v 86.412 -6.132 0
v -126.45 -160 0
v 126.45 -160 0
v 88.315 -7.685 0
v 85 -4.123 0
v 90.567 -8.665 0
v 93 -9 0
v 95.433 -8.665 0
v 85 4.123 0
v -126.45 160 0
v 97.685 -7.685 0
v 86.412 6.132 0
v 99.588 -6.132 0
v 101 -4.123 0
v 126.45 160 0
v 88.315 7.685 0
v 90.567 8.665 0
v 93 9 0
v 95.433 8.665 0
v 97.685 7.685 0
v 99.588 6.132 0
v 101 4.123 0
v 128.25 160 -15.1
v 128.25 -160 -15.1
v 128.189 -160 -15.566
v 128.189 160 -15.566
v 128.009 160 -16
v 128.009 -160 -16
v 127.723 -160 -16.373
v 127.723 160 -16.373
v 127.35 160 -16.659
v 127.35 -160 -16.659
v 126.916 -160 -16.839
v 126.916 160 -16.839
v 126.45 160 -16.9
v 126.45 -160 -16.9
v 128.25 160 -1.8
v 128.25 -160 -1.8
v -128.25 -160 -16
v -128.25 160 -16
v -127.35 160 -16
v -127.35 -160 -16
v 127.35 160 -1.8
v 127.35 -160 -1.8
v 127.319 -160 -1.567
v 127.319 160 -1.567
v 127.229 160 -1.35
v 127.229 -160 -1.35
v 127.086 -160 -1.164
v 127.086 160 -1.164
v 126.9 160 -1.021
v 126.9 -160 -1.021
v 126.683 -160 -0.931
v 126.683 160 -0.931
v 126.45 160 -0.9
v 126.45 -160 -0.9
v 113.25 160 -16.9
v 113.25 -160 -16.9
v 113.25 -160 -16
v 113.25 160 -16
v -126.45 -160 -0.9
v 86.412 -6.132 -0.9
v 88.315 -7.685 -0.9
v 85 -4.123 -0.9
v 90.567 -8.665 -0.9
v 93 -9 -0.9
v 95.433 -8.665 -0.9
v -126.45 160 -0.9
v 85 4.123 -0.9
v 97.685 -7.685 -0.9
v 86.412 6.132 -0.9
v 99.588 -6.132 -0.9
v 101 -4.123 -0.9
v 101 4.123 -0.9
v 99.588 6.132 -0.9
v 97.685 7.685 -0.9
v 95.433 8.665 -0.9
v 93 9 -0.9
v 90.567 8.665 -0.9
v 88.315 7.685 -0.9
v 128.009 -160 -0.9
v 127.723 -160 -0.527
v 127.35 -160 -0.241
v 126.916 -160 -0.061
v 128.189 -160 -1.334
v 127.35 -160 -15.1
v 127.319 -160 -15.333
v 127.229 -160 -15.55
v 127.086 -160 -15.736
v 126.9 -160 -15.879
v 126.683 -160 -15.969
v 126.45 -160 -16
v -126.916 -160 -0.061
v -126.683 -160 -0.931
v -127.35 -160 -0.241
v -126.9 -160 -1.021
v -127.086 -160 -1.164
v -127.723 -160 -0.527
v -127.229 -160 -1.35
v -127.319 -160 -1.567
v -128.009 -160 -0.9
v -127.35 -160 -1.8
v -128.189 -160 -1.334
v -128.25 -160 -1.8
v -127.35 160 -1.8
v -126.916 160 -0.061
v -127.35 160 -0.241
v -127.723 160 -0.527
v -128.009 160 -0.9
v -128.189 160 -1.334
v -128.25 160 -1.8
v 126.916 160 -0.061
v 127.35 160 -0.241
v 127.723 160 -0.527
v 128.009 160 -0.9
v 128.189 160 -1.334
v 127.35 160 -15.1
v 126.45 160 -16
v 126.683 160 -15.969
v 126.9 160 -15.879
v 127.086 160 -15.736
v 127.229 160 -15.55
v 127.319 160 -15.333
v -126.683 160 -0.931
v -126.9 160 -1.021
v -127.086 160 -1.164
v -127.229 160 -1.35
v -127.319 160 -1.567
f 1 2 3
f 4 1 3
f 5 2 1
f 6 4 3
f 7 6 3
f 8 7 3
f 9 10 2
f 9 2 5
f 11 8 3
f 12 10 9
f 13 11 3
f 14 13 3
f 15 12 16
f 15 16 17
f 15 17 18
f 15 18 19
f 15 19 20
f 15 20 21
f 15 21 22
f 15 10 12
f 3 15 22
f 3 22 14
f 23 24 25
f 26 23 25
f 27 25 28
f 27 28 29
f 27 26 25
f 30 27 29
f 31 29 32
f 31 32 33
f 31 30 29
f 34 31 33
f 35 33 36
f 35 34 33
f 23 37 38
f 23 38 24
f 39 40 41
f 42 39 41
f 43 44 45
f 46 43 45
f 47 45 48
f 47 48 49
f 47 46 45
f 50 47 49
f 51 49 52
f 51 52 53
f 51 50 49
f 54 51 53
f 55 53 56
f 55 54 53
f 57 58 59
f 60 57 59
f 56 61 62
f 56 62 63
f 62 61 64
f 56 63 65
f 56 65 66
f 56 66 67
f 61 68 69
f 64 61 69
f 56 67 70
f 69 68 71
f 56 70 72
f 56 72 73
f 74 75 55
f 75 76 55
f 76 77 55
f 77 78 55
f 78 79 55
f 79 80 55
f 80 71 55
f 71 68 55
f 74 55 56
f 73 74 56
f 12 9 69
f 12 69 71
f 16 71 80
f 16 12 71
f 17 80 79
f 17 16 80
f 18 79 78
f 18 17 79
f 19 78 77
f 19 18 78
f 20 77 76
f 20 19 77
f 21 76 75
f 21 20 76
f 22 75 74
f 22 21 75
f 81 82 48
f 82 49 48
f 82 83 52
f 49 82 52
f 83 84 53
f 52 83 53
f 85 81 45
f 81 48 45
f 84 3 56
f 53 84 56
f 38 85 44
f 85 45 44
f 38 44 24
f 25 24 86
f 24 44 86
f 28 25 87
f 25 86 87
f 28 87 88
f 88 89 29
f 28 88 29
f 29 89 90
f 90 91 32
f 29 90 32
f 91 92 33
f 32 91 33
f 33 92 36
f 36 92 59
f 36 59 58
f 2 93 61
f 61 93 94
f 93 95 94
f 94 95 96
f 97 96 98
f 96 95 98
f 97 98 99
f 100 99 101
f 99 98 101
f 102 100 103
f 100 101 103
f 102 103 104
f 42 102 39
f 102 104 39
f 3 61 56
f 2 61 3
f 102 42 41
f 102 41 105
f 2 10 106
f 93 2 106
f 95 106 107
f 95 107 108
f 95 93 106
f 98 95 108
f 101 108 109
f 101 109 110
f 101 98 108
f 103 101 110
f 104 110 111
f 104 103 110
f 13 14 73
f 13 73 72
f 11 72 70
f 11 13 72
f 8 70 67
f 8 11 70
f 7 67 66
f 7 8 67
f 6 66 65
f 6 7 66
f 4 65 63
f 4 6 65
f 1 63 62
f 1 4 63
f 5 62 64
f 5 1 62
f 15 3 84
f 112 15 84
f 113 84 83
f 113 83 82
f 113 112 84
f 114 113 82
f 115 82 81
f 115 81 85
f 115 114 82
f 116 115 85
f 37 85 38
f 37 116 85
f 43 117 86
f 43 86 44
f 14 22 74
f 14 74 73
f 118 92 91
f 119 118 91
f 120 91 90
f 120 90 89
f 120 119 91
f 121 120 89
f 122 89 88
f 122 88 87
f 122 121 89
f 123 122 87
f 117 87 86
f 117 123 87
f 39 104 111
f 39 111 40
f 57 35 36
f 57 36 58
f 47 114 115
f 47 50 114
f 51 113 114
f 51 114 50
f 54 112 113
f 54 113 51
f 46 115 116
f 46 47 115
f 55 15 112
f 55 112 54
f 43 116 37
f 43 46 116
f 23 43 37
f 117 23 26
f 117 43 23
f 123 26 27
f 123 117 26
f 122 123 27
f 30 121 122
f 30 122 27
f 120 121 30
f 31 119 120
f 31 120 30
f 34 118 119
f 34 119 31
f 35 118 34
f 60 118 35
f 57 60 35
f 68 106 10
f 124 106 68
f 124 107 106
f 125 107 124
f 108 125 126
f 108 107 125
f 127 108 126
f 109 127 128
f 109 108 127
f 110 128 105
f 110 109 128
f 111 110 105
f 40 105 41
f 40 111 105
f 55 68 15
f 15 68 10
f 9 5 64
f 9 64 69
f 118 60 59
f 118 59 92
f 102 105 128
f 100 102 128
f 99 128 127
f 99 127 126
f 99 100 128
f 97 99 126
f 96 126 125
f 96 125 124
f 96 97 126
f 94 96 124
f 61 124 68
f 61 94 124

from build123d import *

# Parameters (mm, degrees)
SKETCH1_W                      = 256.5
SKETCH1_H                      = 320
BASE_FLANGE1_DEPTH             = 0.9
EDGE_FLANGE1_STRIP_W           = 5.4
EDGE_FLANGE1_STRIP_H           = 0.9
EDGE_FLANGE1_STRIP_CUT_DEPTH   = 320
EDGE_FLANGE1_STRIP_2_W         = 5.4
EDGE_FLANGE1_STRIP_2_H         = 0.9
EDGE_FLANGE1_STRIP_CUT_2_DEPTH = 320
EDGE_FLANGE1_DEPTH             = 320
EDGE_FLANGE1_BEND_DEPTH        = 320
EDGE_FLANGE2_STRIP_W           = 5.4
EDGE_FLANGE2_STRIP_H           = 0.9
EDGE_FLANGE2_STRIP_CUT_DEPTH   = 320
EDGE_FLANGE2_DEPTH             = 320
CUT_EXTRUDE1_DEPTH             = 206.751482376


# Sheet-metal steps are written as plain solids
with BuildPart() as part:
    # Sketch1 → Base-Flange1 (new body)
    with BuildSketch(Plane.XY):
        Rectangle(SKETCH1_W, SKETCH1_H)
    extrude(amount=-BASE_FLANGE1_DEPTH)

    # Edge-Flange1 strip (across the edge) → Edge-Flange1 strip cut (cut)
    with BuildSketch(Plane(origin=(128.25, 160, -0.9), x_dir=(-1, 0, 0), z_dir=(0, -1, 0))):
        with Locations((-0.9, -0.45)):
            Rectangle(EDGE_FLANGE1_STRIP_W, EDGE_FLANGE1_STRIP_H)
    extrude(amount=EDGE_FLANGE1_STRIP_CUT_DEPTH, mode=Mode.SUBTRACT)

    # Edge-Flange1 strip 2 (across the edge) → Edge-Flange1 strip cut 2 (cut)
    with BuildSketch(Plane(origin=(-128.25, -160, -0.9), x_dir=(1, 0, 0), z_dir=(0, 1, 0))):
        with Locations((-0.9, -0.45)):
            Rectangle(EDGE_FLANGE1_STRIP_2_W, EDGE_FLANGE1_STRIP_2_H)
    extrude(amount=EDGE_FLANGE1_STRIP_CUT_2_DEPTH, mode=Mode.SUBTRACT)

    # Edge-Flange1 section (across the edge) → Edge-Flange1 (add)
    with BuildSketch(Plane(origin=(128.25, 160, -0.9), x_dir=(-1, 0, 0), z_dir=(0, -1, 0))):
        with BuildLine():
            Line((0, 0.9), (0, 15.1))
            Line((0, 15.1), (0.9, 15.1))
            Line((0.9, 15.1), (0.9, 0.9))
            ThreePointArc((0.9, 0.9), (1.163603897, 0.263603897), (1.8, 0))
            Line((1.8, 0), (1.8, -0.9))
            ThreePointArc((1.8, -0.9), (0.527207794, -0.372792206), (0, 0.9))
        make_face()
    extrude(amount=EDGE_FLANGE1_DEPTH)

    # Edge-Flange1 section 2 (across the edge) → Edge-Flange1 bend (add)
    with BuildSketch(Plane(origin=(-128.25, -160, -0.9), x_dir=(1, 0, 0), z_dir=(0, 1, 0))):
        with BuildLine():
            Line((0, 0.9), (0, 15.1))
            Line((0, 15.1), (0.9, 15.1))
            Line((0.9, 15.1), (0.9, 0.9))
            ThreePointArc((0.9, 0.9), (1.163603897, 0.263603897), (1.8, 0))
            Line((1.8, 0), (1.8, -0.9))
            ThreePointArc((1.8, -0.9), (0.527207794, -0.372792206), (0, 0.9))
        make_face()
    extrude(amount=EDGE_FLANGE1_BEND_DEPTH)

    # Edge-Flange2 strip (across the edge) → Edge-Flange2 strip cut (cut)
    with BuildSketch(Plane(origin=(127.35, 160, -16), x_dir=(0, 0, 1), z_dir=(0, -1, 0))):
        with Locations((-1.8, -0.45)):
            Rectangle(EDGE_FLANGE2_STRIP_W, EDGE_FLANGE2_STRIP_H)
    extrude(amount=EDGE_FLANGE2_STRIP_CUT_DEPTH, mode=Mode.SUBTRACT)

    # Edge-Flange2 section (across the edge) → Edge-Flange2 (add)
    with BuildSketch(Plane(origin=(127.35, 160, -16), x_dir=(0, 0, 1), z_dir=(0, -1, 0))):
        with BuildLine():
            Line((-0.9, 0.9), (-0.9, 14.1))
            Line((-0.9, 14.1), (0, 14.1))
            Line((0, 14.1), (0, 0.9))
            ThreePointArc((0, 0.9), (0.263603897, 0.263603897), (0.9, 0))
            Line((0.9, 0), (0.9, -0.9))
            ThreePointArc((0.9, -0.9), (-0.372792206, -0.372792206), (-0.9, 0.9))
        make_face()
    extrude(amount=EDGE_FLANGE2_DEPTH)

    # Sketch24 → Cut-Extrude1 (cut, through all)
    with BuildSketch(Plane.XY):
        with BuildLine():
            Line((101, 4.123105626), (101, -4.123105626))
            ThreePointArc((101, -4.123105626), (93, -9), (85, -4.123105626))
            Line((85, -4.123105626), (85, 4.123105626))
            ThreePointArc((85, 4.123105626), (93, 9), (101, 4.123105626))
        make_face()
    extrude(amount=-CUT_EXTRUDE1_DEPTH, mode=Mode.SUBTRACT)


solid = part.part
